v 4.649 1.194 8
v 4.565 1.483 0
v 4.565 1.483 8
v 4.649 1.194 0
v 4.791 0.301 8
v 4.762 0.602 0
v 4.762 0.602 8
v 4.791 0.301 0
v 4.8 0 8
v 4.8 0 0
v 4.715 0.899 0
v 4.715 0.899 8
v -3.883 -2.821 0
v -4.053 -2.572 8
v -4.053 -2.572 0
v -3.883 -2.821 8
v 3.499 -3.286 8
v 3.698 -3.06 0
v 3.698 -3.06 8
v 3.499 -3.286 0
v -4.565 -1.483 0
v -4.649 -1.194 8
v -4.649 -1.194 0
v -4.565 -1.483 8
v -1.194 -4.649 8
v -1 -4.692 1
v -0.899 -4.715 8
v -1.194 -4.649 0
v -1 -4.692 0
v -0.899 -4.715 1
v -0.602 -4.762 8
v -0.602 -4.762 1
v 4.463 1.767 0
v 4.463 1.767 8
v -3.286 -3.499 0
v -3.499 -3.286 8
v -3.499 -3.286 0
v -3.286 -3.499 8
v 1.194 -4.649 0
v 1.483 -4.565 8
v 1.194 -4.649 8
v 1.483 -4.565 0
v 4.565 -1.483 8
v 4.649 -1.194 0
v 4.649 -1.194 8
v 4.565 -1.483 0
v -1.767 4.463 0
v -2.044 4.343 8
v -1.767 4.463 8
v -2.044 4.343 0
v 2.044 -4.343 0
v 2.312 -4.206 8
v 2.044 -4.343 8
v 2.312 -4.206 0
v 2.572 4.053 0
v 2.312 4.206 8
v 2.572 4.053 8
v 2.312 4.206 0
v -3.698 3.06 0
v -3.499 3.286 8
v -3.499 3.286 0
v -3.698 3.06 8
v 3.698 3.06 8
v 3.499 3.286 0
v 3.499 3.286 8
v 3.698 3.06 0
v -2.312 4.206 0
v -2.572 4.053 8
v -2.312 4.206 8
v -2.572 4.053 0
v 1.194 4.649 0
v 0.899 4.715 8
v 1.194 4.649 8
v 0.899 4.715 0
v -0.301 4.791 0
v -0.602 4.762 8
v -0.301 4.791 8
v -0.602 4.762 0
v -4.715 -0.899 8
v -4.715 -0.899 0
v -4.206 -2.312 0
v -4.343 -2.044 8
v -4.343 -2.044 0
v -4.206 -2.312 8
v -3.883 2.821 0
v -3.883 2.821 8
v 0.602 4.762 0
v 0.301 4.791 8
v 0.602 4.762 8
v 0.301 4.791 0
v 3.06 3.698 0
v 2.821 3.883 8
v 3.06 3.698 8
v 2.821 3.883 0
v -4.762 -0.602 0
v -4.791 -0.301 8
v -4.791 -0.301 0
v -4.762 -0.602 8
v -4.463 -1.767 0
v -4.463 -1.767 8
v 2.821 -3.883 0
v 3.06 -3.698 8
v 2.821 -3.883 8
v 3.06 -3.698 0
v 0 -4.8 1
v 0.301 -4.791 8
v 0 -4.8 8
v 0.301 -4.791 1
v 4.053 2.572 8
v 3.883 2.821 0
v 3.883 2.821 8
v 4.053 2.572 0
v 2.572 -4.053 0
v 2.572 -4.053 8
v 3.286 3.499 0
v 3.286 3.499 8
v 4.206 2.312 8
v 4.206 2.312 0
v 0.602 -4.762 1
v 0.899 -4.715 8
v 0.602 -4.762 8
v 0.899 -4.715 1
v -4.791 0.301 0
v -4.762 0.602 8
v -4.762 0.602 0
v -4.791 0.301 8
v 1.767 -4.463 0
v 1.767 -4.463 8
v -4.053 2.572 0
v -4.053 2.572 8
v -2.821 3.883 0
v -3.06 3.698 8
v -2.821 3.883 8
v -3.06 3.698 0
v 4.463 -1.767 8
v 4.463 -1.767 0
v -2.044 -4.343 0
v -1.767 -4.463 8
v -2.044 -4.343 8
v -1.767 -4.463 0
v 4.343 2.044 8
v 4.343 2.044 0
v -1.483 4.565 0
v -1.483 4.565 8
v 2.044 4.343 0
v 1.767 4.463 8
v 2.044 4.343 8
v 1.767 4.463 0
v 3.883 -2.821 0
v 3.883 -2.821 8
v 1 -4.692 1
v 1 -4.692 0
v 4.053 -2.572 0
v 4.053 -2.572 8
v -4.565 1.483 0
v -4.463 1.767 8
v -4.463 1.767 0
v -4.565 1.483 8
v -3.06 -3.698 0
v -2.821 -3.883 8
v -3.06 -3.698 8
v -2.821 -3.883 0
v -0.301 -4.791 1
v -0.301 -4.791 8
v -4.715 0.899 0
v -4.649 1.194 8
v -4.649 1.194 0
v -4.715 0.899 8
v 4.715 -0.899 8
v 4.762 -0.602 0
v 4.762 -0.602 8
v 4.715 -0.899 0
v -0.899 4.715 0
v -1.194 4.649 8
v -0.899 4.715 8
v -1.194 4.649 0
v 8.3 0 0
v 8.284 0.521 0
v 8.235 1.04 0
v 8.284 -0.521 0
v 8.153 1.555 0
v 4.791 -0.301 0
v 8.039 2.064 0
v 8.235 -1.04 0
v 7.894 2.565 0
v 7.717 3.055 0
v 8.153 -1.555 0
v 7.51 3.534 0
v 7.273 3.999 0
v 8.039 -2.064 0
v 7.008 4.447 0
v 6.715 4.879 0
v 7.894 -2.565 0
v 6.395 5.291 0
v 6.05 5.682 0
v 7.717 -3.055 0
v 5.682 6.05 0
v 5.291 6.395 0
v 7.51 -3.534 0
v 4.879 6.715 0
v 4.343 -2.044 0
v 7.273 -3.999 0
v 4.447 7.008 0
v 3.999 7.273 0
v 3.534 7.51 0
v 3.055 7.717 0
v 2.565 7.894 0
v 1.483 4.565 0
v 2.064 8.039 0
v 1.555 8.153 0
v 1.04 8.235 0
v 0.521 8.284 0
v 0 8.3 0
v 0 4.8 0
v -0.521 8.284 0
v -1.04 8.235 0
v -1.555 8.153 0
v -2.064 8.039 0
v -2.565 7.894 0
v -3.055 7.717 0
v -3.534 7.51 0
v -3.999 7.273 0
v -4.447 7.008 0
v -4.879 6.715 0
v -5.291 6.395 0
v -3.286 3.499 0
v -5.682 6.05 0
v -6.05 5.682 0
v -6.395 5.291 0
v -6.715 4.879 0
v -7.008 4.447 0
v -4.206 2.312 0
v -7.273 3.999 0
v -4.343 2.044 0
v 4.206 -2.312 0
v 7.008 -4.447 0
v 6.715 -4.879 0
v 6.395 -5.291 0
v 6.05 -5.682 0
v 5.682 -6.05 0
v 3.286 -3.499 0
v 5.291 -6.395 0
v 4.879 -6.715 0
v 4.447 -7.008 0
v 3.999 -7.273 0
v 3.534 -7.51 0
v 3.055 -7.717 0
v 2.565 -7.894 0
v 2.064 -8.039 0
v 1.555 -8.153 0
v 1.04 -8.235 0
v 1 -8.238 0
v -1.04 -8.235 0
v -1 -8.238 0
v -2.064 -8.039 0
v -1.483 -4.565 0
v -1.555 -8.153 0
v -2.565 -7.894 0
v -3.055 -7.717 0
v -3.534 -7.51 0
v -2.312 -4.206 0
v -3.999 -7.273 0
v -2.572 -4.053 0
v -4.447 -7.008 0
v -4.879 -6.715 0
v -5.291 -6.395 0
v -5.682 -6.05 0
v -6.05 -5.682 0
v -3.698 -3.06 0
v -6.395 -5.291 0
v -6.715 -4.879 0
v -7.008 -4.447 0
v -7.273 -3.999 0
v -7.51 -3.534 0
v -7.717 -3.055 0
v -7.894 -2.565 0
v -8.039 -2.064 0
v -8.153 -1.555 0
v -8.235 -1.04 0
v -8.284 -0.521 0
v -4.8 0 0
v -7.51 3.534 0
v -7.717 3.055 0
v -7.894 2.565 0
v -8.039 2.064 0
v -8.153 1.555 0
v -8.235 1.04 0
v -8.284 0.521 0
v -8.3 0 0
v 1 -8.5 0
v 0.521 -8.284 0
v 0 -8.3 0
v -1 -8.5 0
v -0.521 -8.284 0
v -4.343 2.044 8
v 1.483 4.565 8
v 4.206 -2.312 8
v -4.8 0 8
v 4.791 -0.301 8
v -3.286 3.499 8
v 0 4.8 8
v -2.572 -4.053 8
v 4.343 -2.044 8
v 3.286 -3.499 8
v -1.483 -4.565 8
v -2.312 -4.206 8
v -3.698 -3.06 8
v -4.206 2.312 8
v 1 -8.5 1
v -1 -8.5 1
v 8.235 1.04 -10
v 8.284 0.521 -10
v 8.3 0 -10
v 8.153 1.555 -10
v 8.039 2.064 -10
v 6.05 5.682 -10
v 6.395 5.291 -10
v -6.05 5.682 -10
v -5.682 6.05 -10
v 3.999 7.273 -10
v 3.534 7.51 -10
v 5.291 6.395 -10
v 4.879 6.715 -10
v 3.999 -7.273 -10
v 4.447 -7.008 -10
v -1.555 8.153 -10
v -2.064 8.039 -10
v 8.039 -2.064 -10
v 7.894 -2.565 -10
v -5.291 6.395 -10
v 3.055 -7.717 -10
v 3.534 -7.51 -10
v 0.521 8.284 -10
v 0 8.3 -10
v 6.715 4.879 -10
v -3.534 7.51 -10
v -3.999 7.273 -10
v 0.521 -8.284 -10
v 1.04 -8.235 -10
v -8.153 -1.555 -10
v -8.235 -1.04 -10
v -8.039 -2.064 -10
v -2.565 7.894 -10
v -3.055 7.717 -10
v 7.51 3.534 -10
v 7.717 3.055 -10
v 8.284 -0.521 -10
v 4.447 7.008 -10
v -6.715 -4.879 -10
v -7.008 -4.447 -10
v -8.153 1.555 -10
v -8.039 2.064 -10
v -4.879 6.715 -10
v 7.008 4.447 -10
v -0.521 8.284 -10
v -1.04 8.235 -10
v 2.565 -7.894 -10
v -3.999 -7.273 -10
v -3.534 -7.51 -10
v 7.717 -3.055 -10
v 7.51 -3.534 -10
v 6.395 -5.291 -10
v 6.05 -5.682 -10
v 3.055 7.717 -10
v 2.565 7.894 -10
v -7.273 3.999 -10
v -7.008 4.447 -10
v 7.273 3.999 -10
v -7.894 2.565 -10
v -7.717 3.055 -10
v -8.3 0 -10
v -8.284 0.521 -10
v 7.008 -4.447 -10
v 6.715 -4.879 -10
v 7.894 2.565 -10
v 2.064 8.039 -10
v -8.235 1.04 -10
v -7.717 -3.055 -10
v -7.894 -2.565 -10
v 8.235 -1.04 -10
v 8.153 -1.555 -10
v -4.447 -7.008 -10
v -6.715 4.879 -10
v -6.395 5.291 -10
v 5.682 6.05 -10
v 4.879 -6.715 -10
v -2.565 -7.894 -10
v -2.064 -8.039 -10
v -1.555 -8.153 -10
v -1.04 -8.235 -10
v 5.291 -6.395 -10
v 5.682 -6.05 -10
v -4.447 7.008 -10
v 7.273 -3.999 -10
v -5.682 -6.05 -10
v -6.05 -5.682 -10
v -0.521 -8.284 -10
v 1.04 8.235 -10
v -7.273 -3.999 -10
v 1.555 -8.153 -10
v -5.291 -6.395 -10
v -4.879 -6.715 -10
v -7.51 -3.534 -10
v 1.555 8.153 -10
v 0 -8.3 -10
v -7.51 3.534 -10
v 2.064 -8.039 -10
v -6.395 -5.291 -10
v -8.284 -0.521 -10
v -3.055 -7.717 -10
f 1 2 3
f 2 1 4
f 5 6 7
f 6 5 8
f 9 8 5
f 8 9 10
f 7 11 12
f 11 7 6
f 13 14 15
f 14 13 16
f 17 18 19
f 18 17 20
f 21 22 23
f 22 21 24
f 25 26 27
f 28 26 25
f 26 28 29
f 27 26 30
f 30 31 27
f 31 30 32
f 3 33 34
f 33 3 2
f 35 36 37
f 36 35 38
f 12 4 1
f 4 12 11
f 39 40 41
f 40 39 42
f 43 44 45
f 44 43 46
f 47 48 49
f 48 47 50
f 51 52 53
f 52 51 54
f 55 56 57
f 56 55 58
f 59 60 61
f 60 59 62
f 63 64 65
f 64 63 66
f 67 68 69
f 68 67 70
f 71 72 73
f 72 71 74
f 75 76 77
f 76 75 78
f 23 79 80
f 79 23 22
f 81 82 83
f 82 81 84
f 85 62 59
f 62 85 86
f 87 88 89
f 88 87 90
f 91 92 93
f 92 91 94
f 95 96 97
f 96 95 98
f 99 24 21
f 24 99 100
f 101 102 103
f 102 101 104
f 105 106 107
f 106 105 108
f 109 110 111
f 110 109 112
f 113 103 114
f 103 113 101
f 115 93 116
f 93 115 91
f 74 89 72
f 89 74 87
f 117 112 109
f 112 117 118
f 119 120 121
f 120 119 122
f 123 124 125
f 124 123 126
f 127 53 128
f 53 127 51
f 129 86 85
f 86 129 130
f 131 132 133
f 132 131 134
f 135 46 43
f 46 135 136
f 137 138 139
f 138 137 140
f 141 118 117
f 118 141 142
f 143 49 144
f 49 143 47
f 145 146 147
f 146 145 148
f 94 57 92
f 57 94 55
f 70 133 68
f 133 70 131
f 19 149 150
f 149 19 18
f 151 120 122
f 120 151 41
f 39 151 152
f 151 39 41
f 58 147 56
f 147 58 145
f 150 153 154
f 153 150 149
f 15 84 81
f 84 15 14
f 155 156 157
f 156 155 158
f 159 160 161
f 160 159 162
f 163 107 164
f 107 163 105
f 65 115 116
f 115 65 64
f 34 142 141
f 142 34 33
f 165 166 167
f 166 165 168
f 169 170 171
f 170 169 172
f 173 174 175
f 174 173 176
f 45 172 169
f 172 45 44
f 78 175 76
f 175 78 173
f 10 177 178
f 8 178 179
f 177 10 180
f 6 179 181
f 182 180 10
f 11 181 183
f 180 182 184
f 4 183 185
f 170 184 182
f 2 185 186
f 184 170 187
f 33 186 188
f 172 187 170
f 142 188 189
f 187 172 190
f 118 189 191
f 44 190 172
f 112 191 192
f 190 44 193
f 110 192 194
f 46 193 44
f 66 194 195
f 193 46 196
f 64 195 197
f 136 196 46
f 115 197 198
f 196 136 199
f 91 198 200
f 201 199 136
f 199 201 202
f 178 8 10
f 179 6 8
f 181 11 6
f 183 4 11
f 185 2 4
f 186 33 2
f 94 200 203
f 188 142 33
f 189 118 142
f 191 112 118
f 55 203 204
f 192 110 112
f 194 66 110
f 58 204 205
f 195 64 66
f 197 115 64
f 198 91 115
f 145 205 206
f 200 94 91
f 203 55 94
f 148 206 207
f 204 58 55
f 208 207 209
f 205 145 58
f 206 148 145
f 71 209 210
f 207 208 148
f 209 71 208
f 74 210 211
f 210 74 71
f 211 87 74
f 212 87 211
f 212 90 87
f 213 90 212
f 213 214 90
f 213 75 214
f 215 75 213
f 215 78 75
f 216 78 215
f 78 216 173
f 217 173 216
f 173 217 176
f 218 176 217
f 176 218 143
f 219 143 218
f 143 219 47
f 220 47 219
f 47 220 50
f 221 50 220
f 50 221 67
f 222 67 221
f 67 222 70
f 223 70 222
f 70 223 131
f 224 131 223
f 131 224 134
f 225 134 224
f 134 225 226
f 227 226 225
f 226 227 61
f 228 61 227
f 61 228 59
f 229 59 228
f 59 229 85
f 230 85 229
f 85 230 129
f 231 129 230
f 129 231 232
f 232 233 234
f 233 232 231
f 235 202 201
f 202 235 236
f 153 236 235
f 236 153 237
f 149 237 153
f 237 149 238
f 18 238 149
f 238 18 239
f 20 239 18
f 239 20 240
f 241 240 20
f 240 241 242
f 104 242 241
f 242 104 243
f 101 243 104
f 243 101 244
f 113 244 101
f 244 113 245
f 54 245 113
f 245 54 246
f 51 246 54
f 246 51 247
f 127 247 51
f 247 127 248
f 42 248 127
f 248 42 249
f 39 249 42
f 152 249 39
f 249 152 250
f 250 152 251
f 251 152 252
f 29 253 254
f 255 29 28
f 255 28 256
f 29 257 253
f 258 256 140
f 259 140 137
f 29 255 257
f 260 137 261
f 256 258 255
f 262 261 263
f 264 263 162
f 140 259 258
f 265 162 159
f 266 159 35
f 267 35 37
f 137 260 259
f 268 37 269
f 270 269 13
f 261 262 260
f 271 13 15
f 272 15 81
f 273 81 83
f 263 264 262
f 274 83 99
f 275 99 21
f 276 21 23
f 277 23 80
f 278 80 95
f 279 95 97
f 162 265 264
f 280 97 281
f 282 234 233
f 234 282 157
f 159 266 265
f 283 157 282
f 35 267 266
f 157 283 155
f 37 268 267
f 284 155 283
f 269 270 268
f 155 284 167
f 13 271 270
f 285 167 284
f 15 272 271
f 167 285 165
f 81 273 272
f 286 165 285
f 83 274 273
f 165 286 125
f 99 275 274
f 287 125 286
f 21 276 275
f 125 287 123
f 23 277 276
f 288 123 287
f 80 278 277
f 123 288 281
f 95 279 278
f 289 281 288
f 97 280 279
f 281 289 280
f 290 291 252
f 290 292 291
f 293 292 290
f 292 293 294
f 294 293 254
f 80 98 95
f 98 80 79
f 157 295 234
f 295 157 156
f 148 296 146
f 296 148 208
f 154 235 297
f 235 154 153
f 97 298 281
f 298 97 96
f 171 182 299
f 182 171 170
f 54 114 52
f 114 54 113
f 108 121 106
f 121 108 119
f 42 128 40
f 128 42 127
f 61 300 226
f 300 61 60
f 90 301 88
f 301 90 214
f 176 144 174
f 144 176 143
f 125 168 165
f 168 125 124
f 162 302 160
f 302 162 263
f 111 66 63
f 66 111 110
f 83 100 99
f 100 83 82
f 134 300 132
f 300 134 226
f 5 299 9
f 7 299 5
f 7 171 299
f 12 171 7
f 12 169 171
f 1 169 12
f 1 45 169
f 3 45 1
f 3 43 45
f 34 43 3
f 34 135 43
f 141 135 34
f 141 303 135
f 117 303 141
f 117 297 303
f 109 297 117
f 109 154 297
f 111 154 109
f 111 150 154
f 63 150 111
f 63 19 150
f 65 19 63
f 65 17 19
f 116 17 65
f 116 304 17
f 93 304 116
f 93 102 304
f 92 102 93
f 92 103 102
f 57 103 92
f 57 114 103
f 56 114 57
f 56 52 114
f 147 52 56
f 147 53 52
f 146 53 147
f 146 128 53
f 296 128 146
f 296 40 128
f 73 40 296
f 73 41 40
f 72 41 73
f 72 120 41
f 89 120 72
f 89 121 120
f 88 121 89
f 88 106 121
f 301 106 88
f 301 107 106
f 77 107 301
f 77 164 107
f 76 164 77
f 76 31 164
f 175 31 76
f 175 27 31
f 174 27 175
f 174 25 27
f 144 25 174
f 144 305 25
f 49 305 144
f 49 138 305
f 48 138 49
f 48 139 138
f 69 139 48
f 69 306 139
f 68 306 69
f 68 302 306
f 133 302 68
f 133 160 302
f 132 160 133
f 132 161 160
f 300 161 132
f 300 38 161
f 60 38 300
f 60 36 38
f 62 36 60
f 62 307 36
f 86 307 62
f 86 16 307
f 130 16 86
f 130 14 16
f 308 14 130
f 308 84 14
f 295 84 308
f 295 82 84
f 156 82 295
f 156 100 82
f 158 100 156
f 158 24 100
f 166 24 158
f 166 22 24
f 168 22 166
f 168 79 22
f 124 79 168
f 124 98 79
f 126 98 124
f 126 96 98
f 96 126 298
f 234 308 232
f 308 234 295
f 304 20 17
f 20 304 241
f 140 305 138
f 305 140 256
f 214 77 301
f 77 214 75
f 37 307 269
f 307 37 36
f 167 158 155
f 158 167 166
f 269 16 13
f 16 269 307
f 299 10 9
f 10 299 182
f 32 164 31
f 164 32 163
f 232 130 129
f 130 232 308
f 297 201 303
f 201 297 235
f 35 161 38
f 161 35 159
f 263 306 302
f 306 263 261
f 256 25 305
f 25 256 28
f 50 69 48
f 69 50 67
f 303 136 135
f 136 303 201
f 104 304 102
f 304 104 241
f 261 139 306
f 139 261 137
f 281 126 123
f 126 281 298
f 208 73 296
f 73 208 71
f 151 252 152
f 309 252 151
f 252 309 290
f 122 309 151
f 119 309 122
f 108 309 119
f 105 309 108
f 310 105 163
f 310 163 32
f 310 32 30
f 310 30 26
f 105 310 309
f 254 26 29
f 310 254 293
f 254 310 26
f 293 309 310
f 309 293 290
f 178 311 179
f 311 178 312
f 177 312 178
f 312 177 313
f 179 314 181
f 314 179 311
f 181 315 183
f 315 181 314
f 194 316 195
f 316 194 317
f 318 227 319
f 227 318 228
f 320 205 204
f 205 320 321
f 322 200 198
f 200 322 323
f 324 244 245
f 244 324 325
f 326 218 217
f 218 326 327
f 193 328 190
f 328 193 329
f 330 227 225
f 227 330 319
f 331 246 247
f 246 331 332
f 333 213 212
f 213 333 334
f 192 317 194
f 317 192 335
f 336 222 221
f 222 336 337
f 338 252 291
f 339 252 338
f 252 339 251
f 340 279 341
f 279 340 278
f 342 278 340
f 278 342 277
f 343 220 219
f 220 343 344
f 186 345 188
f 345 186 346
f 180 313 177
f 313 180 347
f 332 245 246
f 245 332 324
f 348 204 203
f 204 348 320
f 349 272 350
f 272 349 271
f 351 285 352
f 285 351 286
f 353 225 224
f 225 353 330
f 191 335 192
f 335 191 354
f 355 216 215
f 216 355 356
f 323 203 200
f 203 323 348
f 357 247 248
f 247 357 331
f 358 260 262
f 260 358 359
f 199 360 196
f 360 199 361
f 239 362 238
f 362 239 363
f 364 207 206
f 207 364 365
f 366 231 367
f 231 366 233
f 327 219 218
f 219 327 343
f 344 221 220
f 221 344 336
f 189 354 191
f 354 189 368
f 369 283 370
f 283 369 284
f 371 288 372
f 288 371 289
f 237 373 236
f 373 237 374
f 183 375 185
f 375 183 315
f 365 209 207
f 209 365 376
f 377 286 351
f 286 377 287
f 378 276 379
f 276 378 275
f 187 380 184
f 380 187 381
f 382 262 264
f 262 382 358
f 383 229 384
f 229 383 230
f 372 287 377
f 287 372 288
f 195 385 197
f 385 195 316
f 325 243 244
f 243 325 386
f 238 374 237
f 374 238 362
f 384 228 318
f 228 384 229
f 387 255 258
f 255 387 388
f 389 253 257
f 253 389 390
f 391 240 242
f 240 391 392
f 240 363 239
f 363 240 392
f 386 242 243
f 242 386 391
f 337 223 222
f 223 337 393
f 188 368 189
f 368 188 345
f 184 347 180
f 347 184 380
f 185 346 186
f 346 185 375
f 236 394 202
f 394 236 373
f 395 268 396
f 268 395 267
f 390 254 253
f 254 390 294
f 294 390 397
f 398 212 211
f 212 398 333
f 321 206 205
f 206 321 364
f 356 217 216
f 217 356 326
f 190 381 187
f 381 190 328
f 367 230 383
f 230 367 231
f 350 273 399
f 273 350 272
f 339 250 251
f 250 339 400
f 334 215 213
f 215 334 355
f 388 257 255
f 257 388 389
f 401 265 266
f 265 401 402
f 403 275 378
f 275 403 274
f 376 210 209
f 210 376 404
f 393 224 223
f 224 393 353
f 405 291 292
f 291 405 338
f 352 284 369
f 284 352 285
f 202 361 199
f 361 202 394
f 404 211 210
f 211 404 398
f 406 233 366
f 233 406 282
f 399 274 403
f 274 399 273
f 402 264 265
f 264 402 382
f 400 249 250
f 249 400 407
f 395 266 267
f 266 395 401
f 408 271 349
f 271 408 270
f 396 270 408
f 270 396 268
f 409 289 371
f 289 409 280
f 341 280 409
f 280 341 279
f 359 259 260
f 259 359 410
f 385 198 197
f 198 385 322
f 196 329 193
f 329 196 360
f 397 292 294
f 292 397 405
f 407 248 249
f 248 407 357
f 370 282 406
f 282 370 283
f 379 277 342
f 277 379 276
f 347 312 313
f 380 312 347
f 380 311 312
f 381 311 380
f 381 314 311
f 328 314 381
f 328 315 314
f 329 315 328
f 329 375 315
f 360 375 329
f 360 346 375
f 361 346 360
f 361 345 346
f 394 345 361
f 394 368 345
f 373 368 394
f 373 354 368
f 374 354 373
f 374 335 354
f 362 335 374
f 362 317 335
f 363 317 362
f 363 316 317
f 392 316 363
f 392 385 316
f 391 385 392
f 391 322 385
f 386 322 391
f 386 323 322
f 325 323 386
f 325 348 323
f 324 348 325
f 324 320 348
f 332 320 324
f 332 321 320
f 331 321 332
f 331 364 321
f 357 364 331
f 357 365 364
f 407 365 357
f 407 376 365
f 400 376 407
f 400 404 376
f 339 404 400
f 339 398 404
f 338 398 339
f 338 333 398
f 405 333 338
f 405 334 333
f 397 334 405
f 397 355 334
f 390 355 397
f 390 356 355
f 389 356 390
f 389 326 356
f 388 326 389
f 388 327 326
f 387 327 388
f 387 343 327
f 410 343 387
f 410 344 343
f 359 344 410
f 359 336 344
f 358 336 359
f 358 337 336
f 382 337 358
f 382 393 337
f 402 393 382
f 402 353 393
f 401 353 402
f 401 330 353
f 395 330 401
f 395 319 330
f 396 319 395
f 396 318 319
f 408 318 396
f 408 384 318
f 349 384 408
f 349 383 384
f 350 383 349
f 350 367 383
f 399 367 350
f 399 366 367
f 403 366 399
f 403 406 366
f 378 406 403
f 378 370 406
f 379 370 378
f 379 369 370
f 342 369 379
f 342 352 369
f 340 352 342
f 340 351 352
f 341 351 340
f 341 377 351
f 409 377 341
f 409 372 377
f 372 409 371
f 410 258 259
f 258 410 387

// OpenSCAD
tolerance = 0.3;
$fn = $preview ? 20 : 100;

module switch_sr16() {
    cylinder(r = 4.5 + tolerance, h = 8);
    
    translate([-1, -8.5, 0])
    cube([2, 9, 1]);
       
    translate([0, 0, -10])
    cylinder(r = 8 + tolerance, h = 10);
}

switch_sr16();
